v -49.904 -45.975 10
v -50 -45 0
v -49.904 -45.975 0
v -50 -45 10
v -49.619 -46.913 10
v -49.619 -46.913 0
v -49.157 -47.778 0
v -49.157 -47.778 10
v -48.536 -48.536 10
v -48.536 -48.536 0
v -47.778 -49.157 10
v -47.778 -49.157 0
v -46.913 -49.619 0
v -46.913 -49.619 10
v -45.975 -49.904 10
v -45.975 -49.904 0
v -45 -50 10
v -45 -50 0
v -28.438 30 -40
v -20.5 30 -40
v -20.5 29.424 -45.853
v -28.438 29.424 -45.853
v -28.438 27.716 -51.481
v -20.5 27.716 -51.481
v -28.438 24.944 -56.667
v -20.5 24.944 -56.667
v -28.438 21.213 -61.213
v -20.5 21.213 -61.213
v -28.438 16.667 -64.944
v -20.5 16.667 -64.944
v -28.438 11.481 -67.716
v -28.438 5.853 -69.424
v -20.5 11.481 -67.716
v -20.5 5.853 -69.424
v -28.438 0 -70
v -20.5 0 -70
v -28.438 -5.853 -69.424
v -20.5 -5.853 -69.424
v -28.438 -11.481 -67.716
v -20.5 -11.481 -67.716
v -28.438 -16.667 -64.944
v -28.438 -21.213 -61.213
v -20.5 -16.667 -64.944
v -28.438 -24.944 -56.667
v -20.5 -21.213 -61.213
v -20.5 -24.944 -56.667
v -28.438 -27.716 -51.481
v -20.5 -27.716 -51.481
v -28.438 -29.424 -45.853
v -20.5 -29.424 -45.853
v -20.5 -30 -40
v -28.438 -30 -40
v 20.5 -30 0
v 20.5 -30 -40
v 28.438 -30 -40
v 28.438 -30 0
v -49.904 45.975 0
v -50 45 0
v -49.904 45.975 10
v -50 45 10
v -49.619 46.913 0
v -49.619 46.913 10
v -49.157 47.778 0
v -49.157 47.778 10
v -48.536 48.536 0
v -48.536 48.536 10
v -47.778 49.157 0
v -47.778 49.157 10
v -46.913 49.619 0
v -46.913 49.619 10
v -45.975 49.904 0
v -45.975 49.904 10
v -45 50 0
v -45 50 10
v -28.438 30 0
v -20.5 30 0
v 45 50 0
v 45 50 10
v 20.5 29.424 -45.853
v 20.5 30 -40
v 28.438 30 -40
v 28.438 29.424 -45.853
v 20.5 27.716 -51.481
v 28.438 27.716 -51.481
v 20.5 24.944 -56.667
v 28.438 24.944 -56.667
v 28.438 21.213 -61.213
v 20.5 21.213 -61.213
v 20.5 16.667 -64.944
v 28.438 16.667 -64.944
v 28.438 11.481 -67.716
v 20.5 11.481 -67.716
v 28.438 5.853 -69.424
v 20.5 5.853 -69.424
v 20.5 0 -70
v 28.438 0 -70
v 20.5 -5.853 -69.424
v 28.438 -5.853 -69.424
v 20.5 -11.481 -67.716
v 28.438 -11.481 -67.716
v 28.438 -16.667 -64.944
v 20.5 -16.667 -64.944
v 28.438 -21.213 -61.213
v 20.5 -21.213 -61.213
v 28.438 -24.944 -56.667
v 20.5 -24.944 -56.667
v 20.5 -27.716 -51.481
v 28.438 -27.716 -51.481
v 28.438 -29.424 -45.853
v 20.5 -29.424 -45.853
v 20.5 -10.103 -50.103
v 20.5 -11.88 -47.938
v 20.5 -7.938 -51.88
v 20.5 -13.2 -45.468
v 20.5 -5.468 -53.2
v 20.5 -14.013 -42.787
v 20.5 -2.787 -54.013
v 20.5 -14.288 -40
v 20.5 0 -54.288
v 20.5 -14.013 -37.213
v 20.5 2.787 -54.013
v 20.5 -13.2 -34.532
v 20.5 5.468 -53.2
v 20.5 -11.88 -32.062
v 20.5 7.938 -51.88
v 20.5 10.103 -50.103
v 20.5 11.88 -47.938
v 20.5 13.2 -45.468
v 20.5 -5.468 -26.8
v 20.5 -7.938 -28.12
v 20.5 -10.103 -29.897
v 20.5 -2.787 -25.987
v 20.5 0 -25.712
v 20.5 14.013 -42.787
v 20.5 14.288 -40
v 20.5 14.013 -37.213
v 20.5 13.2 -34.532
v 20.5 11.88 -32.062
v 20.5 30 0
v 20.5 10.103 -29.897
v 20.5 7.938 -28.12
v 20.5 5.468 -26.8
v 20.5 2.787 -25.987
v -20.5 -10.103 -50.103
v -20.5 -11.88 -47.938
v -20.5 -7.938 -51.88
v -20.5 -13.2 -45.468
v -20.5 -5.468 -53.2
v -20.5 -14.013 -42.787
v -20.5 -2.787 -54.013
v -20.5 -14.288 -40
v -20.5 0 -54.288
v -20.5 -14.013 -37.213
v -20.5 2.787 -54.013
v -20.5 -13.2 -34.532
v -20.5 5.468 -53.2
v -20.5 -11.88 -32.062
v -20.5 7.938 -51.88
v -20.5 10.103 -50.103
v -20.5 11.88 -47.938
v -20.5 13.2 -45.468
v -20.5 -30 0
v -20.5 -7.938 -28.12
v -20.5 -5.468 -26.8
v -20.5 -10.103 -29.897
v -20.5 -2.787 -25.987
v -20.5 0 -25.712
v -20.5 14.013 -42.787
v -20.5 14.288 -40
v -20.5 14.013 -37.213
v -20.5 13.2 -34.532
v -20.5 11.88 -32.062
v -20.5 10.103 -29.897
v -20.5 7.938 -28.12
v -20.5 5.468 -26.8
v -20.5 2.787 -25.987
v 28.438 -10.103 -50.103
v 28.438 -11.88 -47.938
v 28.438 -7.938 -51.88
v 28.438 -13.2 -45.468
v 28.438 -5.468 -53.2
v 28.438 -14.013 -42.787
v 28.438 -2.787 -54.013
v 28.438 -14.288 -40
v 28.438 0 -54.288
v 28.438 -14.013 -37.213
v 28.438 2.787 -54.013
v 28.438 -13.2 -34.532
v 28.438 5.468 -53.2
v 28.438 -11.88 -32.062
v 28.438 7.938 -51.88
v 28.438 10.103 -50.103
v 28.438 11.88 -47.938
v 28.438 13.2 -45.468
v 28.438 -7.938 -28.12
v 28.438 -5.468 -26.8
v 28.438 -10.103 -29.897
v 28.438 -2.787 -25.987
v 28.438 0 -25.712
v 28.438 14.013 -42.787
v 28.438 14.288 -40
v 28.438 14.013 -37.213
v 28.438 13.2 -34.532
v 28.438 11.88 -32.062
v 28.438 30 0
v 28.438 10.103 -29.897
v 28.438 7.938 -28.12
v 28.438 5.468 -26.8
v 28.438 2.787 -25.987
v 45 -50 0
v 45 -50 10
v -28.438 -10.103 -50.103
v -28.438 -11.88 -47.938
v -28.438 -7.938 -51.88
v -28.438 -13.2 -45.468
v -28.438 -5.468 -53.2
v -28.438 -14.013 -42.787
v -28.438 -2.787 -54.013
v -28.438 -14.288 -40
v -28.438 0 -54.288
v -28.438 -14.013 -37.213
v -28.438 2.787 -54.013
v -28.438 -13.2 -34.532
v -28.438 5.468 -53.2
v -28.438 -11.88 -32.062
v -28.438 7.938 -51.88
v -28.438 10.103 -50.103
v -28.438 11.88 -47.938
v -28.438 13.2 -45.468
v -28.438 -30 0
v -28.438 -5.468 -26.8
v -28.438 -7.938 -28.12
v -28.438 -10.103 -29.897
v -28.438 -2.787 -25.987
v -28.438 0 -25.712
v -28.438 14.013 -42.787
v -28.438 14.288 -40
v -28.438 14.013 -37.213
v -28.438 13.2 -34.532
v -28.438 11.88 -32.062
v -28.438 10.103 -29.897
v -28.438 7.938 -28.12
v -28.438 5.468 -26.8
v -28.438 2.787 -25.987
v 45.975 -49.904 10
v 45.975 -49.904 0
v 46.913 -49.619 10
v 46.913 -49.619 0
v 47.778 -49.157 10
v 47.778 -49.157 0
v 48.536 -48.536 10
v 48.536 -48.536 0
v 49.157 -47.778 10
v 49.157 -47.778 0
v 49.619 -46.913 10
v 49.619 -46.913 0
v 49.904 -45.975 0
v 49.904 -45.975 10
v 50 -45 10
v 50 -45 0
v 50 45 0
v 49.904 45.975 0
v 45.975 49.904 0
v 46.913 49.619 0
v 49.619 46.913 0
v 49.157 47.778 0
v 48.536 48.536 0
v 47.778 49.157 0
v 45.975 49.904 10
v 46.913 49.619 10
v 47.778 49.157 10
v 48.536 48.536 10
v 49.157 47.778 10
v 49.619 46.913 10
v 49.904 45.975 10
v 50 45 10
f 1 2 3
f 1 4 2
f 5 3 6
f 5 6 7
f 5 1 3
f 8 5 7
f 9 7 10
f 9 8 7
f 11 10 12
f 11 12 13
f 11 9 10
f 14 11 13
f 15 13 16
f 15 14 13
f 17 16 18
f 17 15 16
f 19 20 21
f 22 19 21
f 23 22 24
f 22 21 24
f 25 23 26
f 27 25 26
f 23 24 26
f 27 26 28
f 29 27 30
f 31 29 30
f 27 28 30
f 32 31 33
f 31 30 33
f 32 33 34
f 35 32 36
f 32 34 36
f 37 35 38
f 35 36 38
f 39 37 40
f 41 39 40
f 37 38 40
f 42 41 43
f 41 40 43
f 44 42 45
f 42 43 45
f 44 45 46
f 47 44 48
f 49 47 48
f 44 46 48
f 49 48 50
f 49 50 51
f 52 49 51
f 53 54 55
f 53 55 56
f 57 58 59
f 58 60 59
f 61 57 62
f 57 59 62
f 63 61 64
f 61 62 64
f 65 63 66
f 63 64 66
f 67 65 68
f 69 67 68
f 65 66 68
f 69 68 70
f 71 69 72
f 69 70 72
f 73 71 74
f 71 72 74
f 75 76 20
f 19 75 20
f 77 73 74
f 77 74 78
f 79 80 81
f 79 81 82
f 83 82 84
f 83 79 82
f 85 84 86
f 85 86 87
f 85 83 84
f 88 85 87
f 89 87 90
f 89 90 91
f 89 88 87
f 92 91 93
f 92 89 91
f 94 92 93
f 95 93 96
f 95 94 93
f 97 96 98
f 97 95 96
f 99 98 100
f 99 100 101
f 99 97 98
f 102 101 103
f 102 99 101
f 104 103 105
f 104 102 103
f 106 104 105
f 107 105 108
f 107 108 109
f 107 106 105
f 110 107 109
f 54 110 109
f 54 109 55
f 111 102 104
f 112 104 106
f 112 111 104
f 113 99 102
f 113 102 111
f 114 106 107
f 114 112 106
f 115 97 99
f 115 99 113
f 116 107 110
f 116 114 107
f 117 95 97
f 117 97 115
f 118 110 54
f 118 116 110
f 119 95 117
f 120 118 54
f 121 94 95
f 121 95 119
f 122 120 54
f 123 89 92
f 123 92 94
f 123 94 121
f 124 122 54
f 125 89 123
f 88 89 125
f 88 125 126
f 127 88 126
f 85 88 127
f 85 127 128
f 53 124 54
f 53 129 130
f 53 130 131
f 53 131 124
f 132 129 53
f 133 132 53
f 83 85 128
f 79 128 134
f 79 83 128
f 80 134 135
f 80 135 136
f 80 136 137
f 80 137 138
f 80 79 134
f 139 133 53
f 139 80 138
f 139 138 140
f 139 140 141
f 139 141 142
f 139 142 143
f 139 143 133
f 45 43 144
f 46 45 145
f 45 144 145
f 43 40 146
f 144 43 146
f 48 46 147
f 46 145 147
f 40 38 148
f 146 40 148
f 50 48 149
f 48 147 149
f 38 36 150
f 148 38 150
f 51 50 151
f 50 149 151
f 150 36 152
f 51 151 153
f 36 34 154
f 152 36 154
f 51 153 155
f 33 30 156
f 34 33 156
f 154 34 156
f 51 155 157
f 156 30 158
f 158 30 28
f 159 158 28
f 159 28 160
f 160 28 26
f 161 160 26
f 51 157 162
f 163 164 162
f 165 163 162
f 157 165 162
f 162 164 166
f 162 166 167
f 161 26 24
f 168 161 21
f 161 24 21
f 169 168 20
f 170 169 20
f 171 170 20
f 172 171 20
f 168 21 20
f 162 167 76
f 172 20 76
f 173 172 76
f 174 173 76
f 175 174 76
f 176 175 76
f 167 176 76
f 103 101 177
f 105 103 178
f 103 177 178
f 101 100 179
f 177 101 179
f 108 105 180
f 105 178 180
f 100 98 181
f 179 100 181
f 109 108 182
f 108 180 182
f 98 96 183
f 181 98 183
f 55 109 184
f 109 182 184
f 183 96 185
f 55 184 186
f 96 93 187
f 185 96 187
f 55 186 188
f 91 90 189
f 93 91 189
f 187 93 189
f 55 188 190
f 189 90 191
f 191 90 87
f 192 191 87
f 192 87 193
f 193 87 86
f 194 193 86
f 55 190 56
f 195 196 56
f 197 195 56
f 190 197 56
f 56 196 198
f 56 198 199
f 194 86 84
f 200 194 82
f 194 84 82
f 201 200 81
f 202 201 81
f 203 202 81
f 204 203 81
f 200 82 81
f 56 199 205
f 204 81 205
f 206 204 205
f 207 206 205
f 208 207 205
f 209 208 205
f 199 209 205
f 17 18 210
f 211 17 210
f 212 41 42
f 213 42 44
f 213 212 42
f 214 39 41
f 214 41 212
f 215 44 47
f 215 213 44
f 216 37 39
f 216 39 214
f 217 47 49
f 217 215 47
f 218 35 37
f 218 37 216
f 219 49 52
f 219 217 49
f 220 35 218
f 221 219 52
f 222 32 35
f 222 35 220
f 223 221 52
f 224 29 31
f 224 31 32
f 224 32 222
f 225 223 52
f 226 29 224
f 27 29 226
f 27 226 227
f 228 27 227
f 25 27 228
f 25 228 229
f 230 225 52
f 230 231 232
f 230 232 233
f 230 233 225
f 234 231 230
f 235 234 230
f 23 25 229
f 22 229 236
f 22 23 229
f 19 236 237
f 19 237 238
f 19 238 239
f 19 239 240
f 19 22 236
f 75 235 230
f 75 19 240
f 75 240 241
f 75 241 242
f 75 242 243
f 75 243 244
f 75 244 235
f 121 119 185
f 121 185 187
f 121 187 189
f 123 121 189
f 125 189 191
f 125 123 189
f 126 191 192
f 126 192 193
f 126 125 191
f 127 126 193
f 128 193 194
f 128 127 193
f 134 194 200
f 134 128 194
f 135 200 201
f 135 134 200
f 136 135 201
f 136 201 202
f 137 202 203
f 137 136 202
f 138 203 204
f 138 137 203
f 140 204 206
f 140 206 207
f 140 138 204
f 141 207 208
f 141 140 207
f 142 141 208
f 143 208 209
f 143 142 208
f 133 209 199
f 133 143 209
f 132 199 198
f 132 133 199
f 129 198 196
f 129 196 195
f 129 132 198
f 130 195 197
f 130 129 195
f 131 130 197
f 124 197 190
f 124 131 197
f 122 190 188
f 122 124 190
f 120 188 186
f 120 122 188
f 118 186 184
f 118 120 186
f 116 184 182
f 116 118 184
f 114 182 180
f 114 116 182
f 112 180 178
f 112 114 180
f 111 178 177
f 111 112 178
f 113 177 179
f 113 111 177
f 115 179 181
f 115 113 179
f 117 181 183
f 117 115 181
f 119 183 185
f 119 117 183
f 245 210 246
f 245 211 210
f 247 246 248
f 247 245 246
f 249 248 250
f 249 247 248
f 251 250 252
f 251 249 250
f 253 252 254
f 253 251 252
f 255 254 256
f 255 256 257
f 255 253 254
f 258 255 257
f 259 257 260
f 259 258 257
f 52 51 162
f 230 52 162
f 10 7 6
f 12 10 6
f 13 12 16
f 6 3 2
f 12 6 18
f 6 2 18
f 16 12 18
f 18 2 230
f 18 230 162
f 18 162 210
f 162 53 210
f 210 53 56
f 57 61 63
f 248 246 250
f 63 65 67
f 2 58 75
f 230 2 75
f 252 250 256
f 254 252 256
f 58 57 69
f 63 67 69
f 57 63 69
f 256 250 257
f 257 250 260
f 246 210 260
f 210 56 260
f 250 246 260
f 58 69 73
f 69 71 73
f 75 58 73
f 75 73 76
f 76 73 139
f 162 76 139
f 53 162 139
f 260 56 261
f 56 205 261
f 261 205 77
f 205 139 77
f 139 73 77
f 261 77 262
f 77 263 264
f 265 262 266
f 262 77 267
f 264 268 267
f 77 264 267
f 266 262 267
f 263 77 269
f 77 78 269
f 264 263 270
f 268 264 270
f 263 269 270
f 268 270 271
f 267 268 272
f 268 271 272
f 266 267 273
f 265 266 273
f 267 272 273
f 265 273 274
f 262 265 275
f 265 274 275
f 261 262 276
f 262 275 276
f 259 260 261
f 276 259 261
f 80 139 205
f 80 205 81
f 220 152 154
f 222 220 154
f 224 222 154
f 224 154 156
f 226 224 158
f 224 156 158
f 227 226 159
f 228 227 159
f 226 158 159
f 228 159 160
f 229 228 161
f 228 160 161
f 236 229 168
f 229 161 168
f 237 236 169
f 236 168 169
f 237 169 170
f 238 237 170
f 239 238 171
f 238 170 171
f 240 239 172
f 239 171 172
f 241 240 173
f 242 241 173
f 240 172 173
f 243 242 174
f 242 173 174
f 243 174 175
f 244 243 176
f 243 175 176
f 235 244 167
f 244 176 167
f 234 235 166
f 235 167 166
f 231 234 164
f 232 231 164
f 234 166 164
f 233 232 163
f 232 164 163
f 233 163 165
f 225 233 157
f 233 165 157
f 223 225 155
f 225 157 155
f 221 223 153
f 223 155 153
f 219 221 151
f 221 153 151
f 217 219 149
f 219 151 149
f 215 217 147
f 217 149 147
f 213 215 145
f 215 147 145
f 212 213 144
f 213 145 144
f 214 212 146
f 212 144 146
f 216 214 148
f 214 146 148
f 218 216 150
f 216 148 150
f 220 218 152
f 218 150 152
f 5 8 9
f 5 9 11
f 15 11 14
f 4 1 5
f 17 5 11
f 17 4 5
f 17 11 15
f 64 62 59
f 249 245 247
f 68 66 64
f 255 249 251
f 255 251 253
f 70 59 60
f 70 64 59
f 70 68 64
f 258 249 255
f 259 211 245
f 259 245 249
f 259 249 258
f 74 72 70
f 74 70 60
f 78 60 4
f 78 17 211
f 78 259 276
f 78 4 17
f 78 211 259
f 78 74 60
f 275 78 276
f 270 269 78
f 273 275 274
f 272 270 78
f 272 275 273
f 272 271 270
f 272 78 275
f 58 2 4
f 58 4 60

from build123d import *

# Parameters (mm, degrees)
SKETCH2_W           = 100
SKETCH2_H           = 100
BOSS_EXTRUDE1_DEPTH = 10
SKETCH3_R           = 14.2875
BOSS_EXTRUDE2_DEPTH = 7.9375
FILLET1_R           = 5


with BuildPart() as part:
    # Sketch2 → Boss-Extrude1 (new body)
    with BuildSketch(Plane.XY):
        Rectangle(SKETCH2_W, SKETCH2_H)
    extrude(amount=BOSS_EXTRUDE1_DEPTH)

    # Sketch3 → Boss-Extrude2 (add)
    with BuildSketch(Plane(origin=(20.5, 0, 0), x_dir=(0, 0, -1), z_dir=(1, 0, 0))):
        with BuildLine():
            Line((0, 30), (40, 30))
            ThreePointArc((40, 30), (70, 0), (40, -30))
            Line((40, -30), (0, -30))
            Line((0, -30), (0, 30))
        make_face()
        with Locations((40, 0)):
            Circle(SKETCH3_R, mode=Mode.SUBTRACT)
    boss_extrude2 = extrude(amount=BOSS_EXTRUDE2_DEPTH)

    # Mirror1: Boss-Extrude2 across plane
    add(boss_extrude2.mirror(Plane(origin=(0, 0, 0), x_dir=(0, 0, 1), z_dir=(1, 0, 0))))

    # Fillet1
    fillet1_edges = [part.edges().sort_by_distance(p)[0] for p in [
        (-50, 50, 5),
        (50, 50, 5),
        (50, -50, 5),
        (-50, -50, 5),
    ]]
    fillet(fillet1_edges, radius=FILLET1_R)


solid = part.part
